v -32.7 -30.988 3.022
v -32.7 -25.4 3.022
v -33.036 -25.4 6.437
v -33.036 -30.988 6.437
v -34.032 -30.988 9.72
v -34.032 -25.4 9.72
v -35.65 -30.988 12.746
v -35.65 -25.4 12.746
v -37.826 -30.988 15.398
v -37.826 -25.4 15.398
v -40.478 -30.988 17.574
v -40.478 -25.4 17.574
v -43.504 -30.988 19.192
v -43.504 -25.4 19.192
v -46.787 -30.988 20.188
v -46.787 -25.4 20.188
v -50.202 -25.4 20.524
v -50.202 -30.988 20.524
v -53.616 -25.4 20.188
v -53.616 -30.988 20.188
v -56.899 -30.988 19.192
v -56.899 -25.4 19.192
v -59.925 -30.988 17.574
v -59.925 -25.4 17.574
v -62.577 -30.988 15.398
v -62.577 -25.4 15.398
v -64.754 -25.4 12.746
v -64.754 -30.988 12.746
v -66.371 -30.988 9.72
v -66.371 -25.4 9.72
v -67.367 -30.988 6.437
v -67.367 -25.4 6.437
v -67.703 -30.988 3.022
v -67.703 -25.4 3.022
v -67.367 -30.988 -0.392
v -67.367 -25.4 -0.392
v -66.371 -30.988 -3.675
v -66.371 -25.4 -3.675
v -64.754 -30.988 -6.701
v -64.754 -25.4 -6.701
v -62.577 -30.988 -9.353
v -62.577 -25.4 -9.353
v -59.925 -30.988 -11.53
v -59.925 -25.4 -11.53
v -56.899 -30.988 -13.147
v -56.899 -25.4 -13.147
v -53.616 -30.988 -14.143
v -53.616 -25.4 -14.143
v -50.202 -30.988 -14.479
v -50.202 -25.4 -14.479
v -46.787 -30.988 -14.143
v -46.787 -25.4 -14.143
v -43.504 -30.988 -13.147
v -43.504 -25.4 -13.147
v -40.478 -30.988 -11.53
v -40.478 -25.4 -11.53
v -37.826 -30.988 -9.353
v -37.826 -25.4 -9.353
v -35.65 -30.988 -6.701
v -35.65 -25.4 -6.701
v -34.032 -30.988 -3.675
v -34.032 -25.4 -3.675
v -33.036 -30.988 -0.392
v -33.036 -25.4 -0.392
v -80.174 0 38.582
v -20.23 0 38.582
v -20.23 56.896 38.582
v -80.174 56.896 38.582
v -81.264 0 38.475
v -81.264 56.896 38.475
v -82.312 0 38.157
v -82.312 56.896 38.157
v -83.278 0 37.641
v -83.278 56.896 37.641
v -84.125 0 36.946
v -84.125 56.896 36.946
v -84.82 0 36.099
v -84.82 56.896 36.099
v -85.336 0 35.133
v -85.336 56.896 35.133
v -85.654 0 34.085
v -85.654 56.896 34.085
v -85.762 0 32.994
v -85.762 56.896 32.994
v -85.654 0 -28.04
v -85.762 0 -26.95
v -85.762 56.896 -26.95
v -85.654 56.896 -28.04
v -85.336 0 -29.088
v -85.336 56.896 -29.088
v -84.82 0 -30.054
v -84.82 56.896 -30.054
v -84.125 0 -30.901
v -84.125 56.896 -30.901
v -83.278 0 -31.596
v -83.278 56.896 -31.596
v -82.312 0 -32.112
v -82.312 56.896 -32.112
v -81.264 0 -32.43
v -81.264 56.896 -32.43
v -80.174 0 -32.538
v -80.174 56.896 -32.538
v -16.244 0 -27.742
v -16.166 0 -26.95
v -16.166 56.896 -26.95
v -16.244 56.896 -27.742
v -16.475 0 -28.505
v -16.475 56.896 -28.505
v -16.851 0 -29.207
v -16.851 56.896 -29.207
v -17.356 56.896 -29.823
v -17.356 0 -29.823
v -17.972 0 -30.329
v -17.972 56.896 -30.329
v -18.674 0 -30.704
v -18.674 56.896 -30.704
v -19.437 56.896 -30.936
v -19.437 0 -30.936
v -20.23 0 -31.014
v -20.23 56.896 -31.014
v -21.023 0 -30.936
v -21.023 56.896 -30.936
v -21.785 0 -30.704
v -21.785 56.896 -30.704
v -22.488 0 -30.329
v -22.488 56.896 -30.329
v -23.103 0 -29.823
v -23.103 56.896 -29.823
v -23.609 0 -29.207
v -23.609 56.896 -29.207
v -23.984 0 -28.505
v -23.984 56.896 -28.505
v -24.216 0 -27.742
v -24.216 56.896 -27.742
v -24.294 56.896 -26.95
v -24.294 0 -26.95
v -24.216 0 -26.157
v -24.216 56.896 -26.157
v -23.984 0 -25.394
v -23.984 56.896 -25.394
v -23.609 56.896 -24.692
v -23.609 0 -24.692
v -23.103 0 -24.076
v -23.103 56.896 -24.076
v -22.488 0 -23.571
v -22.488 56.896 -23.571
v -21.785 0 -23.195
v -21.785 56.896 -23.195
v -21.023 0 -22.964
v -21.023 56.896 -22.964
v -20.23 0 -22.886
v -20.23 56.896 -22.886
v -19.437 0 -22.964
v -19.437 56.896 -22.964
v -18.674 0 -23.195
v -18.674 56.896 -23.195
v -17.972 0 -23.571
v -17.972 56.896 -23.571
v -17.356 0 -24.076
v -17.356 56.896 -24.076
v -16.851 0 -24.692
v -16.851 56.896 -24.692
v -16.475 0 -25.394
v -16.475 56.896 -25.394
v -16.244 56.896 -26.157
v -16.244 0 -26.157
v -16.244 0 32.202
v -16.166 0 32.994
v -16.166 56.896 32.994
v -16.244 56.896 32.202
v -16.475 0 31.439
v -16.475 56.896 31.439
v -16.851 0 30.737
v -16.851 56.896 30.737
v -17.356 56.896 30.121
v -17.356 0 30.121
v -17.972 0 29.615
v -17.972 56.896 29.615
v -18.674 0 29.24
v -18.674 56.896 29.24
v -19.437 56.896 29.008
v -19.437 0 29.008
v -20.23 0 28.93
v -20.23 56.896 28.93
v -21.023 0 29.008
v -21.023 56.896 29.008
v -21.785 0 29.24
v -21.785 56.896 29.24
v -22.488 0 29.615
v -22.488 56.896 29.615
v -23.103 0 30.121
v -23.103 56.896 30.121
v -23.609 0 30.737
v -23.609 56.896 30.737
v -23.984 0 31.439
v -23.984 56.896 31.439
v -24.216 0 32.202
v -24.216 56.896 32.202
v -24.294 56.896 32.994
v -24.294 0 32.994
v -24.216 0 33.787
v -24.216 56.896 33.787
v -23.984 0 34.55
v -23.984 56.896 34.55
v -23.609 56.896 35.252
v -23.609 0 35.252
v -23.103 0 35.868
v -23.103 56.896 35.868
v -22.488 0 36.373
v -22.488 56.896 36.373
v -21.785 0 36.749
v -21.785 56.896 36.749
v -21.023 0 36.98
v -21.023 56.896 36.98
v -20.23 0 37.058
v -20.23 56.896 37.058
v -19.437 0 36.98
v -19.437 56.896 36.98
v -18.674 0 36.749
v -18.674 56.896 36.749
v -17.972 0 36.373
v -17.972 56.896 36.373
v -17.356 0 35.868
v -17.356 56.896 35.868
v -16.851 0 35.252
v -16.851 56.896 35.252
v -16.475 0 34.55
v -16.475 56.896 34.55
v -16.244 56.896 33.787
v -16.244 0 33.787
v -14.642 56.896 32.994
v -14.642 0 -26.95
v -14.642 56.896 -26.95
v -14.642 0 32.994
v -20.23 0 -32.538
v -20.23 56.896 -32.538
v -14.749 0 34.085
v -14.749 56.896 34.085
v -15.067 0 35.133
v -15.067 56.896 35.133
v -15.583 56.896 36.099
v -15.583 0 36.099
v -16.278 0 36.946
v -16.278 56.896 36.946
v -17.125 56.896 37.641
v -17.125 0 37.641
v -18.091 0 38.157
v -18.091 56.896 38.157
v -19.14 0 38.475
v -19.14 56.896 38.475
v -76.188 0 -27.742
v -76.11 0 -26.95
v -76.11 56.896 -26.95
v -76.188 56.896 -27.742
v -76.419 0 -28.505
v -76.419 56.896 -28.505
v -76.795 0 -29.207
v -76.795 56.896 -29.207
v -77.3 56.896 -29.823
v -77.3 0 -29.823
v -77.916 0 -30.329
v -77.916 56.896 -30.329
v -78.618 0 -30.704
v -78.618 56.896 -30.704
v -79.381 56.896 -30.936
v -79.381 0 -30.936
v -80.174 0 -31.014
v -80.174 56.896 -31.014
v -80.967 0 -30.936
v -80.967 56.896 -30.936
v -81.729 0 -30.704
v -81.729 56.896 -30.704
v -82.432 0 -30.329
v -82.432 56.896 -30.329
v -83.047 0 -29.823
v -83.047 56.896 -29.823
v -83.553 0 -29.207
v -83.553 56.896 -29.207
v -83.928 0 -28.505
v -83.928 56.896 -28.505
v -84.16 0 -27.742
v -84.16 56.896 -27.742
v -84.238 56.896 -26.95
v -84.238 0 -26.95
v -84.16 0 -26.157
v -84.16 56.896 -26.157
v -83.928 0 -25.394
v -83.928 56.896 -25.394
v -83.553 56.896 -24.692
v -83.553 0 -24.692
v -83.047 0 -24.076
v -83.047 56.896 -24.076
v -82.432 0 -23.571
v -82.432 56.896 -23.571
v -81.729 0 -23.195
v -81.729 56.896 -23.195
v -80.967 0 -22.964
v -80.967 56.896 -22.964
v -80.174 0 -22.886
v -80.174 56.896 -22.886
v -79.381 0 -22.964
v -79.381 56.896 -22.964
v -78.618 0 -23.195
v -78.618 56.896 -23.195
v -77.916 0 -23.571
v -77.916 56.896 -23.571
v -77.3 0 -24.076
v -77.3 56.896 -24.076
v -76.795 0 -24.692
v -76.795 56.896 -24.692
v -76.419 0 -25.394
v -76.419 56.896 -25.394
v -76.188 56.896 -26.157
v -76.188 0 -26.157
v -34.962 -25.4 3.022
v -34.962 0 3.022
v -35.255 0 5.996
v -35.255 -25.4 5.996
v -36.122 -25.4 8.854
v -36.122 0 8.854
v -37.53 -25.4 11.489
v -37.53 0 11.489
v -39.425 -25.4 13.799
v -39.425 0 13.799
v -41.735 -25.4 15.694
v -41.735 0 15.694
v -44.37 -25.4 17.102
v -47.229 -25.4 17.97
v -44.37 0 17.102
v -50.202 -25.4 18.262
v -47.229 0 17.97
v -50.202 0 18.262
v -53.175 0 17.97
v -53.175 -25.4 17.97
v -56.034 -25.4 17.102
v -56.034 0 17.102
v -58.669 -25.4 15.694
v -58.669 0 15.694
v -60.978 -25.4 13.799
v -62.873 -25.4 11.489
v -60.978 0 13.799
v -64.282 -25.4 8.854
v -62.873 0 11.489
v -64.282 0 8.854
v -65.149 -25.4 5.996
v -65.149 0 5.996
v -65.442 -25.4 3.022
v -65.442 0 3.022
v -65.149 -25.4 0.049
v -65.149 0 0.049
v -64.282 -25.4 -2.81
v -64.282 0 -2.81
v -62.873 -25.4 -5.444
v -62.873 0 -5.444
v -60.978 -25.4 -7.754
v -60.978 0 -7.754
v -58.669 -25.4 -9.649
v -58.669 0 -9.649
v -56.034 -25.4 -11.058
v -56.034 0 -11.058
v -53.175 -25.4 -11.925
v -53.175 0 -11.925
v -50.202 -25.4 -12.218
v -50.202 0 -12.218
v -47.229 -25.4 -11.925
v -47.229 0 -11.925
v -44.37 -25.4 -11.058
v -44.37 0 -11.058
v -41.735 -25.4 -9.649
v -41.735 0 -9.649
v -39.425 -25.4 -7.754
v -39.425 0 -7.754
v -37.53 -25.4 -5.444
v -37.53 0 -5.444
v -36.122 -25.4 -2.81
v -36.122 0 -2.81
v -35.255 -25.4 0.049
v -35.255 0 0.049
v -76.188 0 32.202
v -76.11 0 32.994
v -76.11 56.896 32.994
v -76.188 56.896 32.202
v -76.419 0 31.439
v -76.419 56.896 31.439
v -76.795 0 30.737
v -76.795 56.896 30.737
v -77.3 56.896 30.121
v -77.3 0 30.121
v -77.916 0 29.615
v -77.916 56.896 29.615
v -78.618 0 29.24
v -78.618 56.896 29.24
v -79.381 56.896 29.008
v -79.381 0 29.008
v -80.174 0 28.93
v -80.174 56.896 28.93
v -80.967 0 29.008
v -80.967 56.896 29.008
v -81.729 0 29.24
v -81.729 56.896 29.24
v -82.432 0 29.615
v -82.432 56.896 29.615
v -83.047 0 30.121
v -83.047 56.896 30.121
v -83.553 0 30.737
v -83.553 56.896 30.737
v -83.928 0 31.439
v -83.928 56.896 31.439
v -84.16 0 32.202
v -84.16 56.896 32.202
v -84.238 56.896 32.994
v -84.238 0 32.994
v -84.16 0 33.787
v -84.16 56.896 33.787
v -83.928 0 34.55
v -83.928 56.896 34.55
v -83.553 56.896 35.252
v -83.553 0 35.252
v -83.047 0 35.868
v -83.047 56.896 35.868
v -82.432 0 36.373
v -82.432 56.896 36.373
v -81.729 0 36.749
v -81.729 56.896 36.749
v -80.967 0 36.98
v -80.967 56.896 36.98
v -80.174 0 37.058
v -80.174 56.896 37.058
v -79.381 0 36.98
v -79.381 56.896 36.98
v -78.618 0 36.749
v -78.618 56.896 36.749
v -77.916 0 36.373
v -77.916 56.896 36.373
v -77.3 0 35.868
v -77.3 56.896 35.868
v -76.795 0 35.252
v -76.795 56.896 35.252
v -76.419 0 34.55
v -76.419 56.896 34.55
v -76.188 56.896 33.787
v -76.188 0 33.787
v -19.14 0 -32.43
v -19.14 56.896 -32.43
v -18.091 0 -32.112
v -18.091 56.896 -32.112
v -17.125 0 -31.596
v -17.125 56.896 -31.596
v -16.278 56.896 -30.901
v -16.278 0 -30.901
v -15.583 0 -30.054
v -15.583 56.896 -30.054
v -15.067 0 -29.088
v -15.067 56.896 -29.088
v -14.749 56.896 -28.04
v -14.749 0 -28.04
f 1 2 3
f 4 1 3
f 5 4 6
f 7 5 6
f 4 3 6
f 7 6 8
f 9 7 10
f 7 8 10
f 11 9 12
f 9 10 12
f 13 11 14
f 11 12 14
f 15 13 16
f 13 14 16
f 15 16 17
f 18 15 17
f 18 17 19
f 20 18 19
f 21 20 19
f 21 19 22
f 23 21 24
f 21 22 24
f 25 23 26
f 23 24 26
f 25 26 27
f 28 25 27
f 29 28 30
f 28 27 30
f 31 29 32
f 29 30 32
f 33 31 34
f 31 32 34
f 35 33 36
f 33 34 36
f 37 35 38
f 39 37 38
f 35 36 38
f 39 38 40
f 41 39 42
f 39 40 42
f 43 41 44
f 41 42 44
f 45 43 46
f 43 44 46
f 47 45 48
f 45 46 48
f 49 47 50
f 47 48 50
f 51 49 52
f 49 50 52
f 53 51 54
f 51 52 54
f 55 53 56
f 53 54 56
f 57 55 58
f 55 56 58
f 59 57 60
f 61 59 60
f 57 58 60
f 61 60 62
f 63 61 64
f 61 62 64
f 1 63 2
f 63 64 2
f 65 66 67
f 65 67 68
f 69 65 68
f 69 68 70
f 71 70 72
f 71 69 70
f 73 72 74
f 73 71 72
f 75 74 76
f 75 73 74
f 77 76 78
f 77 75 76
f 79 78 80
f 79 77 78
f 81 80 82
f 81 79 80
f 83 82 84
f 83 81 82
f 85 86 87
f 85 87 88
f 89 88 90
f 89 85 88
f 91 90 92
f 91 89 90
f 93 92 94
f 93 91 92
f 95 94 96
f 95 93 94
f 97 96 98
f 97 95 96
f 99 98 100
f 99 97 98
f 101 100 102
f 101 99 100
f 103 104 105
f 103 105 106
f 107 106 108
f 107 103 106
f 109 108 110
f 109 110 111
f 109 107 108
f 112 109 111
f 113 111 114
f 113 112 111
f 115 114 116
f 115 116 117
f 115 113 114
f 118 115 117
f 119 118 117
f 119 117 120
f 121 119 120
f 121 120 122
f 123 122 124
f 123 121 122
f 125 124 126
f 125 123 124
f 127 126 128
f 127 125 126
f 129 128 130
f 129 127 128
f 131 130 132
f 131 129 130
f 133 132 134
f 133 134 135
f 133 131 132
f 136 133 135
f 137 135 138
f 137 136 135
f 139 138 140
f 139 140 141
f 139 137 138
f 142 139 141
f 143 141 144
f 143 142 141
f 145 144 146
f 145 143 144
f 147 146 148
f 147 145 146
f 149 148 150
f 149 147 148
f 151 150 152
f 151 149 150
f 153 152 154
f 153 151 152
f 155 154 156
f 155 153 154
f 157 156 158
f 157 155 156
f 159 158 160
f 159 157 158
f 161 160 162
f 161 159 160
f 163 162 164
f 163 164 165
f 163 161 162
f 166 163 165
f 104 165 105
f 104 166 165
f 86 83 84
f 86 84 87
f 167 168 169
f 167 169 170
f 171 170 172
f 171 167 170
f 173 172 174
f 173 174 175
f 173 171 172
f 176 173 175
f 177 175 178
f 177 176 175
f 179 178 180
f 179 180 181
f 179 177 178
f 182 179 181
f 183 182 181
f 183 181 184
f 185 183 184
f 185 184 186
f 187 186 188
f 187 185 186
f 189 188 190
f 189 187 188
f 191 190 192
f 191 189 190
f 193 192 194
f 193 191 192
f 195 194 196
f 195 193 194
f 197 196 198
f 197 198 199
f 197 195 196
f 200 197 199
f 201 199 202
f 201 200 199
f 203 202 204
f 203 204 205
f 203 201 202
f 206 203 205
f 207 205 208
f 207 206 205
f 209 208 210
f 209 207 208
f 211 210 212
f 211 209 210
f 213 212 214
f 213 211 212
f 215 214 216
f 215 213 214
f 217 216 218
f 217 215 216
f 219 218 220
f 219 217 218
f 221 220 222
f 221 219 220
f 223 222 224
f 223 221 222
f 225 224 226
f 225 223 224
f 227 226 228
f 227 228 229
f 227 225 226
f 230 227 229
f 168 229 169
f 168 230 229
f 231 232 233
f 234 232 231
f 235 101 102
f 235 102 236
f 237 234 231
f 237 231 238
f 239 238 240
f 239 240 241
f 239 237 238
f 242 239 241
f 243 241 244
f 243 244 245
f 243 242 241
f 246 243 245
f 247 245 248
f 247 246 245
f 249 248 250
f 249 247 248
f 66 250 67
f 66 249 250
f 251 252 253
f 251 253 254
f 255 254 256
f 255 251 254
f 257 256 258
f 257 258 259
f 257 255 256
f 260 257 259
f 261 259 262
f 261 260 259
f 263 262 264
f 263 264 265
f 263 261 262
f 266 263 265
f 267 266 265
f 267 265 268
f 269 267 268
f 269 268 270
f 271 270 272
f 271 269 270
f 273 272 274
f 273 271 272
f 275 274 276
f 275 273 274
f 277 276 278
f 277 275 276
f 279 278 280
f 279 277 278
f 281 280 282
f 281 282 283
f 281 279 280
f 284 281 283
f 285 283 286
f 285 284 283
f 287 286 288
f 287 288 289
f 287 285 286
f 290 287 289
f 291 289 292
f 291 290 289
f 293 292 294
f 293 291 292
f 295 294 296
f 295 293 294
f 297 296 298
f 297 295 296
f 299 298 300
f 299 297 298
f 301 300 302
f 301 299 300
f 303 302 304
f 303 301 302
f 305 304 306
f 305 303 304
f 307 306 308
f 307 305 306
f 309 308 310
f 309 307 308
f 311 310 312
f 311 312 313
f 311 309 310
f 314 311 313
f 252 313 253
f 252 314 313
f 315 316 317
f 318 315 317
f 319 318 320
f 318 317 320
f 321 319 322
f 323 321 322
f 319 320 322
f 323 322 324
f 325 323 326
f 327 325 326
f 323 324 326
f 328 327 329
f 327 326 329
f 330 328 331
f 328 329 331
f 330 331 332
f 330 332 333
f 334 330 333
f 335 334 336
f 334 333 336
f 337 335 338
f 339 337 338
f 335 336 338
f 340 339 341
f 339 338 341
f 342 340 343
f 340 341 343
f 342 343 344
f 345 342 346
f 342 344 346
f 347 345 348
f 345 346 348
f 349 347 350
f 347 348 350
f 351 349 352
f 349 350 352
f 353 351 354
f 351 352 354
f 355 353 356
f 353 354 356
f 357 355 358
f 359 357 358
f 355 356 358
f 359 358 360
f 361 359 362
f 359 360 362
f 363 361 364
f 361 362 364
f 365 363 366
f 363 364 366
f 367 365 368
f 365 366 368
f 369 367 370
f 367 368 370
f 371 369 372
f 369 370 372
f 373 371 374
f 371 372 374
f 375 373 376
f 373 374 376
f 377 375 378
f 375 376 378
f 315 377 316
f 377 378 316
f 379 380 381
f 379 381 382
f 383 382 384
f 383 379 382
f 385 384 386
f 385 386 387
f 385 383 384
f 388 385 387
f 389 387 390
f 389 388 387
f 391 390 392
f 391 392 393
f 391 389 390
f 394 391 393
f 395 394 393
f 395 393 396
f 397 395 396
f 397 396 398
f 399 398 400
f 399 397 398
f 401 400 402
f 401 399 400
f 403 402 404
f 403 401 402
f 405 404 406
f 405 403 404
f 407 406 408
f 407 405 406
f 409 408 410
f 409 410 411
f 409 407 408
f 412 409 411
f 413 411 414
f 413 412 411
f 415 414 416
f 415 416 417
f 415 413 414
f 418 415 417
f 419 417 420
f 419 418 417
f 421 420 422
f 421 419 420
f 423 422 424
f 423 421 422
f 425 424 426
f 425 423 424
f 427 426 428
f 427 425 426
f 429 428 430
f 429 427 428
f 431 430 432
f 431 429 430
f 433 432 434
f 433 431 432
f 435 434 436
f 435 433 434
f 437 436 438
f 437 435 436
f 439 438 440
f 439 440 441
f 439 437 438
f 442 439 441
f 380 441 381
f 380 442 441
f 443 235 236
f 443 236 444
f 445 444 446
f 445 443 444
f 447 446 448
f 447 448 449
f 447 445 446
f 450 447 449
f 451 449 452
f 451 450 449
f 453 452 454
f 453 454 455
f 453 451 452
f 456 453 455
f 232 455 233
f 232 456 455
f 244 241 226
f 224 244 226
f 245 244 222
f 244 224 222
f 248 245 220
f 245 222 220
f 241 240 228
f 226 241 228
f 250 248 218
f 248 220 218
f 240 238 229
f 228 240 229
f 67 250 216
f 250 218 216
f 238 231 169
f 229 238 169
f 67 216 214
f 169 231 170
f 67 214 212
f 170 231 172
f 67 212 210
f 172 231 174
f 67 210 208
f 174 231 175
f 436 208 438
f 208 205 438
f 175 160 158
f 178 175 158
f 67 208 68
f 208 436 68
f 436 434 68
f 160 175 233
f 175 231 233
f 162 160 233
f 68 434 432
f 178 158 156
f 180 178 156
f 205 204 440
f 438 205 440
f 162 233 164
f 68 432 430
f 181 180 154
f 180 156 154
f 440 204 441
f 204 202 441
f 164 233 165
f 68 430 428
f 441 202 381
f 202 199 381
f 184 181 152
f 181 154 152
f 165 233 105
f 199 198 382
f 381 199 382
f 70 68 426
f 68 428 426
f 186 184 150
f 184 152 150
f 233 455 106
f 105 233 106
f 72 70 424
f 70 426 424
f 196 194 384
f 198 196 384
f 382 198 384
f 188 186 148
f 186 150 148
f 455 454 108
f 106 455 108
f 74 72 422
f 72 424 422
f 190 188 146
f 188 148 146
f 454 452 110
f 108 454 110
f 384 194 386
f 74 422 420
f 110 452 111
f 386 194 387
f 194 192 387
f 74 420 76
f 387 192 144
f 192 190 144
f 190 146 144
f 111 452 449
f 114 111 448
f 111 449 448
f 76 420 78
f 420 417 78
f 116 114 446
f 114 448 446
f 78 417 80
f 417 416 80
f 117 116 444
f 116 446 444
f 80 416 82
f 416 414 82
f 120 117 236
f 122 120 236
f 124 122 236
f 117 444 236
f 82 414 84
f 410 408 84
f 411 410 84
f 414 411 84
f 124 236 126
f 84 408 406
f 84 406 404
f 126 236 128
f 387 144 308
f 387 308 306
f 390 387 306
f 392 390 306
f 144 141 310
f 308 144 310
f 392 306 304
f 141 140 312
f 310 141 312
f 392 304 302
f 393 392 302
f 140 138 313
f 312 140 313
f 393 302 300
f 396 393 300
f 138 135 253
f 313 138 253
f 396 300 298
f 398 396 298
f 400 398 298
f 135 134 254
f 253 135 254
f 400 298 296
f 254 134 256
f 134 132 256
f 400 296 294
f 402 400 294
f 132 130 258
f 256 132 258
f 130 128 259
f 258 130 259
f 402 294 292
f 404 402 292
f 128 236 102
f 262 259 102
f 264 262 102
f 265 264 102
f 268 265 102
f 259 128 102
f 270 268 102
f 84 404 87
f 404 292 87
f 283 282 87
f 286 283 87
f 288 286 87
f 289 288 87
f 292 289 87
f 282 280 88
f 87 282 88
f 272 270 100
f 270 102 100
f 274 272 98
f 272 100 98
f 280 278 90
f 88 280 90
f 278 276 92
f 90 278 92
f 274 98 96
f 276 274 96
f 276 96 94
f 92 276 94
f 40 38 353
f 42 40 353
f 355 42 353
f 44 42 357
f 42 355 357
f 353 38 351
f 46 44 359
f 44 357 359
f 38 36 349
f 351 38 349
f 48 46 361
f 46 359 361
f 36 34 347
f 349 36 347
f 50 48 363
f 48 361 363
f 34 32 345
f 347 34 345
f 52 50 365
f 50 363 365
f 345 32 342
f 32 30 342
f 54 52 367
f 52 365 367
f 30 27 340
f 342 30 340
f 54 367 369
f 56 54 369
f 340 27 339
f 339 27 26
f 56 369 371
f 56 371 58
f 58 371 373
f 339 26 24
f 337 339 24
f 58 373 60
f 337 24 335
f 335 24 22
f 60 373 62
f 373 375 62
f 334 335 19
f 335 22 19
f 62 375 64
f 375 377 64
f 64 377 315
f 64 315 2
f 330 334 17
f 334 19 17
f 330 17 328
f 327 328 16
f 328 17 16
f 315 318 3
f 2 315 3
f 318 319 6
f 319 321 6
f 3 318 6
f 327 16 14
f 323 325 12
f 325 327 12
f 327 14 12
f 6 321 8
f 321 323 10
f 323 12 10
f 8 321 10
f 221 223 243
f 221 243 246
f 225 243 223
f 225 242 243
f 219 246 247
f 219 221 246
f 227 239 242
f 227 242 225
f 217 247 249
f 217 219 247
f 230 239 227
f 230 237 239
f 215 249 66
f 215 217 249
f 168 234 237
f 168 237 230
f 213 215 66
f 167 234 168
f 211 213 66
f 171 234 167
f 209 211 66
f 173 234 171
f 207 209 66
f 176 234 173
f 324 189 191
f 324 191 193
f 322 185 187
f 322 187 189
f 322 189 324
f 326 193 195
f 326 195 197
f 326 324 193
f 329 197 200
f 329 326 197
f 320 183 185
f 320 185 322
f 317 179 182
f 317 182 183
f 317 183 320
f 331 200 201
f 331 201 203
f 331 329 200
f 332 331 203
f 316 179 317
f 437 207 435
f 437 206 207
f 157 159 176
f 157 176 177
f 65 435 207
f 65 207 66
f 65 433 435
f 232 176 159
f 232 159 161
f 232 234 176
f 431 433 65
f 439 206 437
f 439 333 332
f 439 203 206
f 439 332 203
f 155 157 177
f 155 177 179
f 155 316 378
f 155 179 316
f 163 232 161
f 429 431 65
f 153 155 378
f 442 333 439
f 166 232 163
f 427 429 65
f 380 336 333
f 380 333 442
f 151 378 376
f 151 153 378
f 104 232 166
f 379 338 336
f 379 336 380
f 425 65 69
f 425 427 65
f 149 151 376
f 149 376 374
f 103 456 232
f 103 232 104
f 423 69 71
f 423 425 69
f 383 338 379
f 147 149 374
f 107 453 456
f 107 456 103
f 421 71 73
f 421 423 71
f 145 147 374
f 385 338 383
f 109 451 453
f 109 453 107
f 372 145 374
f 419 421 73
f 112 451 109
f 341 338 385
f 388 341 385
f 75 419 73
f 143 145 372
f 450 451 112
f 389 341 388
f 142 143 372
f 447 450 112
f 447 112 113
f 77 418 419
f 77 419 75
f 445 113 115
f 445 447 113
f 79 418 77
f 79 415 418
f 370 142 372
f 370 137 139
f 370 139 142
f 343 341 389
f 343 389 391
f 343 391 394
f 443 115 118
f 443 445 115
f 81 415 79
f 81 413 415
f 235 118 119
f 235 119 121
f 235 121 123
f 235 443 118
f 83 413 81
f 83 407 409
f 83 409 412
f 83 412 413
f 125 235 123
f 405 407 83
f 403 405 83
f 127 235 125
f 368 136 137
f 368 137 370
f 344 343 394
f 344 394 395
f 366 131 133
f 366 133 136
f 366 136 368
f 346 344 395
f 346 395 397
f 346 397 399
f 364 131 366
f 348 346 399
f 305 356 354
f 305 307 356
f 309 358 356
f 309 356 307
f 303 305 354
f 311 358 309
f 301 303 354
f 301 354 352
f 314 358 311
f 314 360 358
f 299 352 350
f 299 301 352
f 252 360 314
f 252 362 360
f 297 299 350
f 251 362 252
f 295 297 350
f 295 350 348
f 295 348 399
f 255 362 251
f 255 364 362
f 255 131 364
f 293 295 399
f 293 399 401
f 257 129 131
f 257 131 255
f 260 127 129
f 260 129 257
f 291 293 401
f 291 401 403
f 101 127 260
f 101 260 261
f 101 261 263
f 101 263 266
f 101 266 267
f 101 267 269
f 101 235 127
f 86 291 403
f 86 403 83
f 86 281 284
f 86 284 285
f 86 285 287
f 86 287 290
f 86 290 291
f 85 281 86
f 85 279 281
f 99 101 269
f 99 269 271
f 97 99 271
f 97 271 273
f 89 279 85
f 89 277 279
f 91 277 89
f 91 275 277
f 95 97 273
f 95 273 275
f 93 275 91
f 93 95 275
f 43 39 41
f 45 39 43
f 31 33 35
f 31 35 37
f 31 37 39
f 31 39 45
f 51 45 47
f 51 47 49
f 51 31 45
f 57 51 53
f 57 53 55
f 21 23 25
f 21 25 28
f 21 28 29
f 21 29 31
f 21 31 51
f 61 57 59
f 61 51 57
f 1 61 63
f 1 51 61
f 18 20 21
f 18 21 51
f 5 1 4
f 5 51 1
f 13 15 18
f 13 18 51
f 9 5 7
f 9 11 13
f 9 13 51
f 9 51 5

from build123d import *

# Parameters (mm, degrees)
SKETCH1_R           = 4.064
BOSS_EXTRUDE1_DEPTH = 56.896
SKETCH2_R           = 15.24
BOSS_EXTRUDE2_DEPTH = 25.4
SKETCH3_R           = 17.501560838
BOSS_EXTRUDE3_DEPTH = 5.588


with BuildPart() as part:
    # Sketch1 → Boss-Extrude1 (new body)
    with BuildSketch(Plane(origin=(0, 0, 0), x_dir=(1, 0, 0), z_dir=(0, 1, 0))):
        with BuildLine():
            Line((-80.173724845, 32.537607562), (-20.229724845, 32.537607562))
            ThreePointArc((-20.229724845, 32.537607562), (-16.278412152, 30.900920256), (-14.641724845, 26.949607562))
            Line((-14.641724845, 26.949607562), (-14.641724845, -32.994392438))
            ThreePointArc((-14.641724845, -32.994392438), (-16.278412152, -36.945705131), (-20.229724845, -38.582392438))
            Line((-20.229724845, -38.582392438), (-80.173724845, -38.582392438))
            ThreePointArc((-80.173724845, -38.582392438), (-84.125037539, -36.945705131), (-85.761724845, -32.994392438))
            Line((-85.761724845, -32.994392438), (-85.761724845, 26.949607562))
            ThreePointArc((-85.761724845, 26.949607562), (-84.125037539, 30.900920256), (-80.173724845, 32.537607562))
        make_face()
        with Locations((-80.173724845, 26.949607562)):
            Circle(SKETCH1_R, mode=Mode.SUBTRACT)
        with Locations((-80.173724845, -32.994392438)):
            Circle(SKETCH1_R, mode=Mode.SUBTRACT)
        with Locations((-20.229724845, 26.949607562)):
            Circle(SKETCH1_R, mode=Mode.SUBTRACT)
        with Locations((-20.229724845, -32.994392438)):
            Circle(SKETCH1_R, mode=Mode.SUBTRACT)
    extrude(amount=BOSS_EXTRUDE1_DEPTH)

    # Sketch2 → Boss-Extrude2 (add)
    with BuildSketch(Plane.XZ):
        with Locations((-50.201724845, 3.022392438)):
            Circle(SKETCH2_R)
    extrude(amount=BOSS_EXTRUDE2_DEPTH)

    # Sketch3 → Boss-Extrude3 (add)
    with BuildSketch(Plane.XZ.offset(25.4)):
        with Locations((-50.201724845, 3.022392438)):
            Circle(SKETCH3_R)
    extrude(amount=BOSS_EXTRUDE3_DEPTH)


solid = part.part
